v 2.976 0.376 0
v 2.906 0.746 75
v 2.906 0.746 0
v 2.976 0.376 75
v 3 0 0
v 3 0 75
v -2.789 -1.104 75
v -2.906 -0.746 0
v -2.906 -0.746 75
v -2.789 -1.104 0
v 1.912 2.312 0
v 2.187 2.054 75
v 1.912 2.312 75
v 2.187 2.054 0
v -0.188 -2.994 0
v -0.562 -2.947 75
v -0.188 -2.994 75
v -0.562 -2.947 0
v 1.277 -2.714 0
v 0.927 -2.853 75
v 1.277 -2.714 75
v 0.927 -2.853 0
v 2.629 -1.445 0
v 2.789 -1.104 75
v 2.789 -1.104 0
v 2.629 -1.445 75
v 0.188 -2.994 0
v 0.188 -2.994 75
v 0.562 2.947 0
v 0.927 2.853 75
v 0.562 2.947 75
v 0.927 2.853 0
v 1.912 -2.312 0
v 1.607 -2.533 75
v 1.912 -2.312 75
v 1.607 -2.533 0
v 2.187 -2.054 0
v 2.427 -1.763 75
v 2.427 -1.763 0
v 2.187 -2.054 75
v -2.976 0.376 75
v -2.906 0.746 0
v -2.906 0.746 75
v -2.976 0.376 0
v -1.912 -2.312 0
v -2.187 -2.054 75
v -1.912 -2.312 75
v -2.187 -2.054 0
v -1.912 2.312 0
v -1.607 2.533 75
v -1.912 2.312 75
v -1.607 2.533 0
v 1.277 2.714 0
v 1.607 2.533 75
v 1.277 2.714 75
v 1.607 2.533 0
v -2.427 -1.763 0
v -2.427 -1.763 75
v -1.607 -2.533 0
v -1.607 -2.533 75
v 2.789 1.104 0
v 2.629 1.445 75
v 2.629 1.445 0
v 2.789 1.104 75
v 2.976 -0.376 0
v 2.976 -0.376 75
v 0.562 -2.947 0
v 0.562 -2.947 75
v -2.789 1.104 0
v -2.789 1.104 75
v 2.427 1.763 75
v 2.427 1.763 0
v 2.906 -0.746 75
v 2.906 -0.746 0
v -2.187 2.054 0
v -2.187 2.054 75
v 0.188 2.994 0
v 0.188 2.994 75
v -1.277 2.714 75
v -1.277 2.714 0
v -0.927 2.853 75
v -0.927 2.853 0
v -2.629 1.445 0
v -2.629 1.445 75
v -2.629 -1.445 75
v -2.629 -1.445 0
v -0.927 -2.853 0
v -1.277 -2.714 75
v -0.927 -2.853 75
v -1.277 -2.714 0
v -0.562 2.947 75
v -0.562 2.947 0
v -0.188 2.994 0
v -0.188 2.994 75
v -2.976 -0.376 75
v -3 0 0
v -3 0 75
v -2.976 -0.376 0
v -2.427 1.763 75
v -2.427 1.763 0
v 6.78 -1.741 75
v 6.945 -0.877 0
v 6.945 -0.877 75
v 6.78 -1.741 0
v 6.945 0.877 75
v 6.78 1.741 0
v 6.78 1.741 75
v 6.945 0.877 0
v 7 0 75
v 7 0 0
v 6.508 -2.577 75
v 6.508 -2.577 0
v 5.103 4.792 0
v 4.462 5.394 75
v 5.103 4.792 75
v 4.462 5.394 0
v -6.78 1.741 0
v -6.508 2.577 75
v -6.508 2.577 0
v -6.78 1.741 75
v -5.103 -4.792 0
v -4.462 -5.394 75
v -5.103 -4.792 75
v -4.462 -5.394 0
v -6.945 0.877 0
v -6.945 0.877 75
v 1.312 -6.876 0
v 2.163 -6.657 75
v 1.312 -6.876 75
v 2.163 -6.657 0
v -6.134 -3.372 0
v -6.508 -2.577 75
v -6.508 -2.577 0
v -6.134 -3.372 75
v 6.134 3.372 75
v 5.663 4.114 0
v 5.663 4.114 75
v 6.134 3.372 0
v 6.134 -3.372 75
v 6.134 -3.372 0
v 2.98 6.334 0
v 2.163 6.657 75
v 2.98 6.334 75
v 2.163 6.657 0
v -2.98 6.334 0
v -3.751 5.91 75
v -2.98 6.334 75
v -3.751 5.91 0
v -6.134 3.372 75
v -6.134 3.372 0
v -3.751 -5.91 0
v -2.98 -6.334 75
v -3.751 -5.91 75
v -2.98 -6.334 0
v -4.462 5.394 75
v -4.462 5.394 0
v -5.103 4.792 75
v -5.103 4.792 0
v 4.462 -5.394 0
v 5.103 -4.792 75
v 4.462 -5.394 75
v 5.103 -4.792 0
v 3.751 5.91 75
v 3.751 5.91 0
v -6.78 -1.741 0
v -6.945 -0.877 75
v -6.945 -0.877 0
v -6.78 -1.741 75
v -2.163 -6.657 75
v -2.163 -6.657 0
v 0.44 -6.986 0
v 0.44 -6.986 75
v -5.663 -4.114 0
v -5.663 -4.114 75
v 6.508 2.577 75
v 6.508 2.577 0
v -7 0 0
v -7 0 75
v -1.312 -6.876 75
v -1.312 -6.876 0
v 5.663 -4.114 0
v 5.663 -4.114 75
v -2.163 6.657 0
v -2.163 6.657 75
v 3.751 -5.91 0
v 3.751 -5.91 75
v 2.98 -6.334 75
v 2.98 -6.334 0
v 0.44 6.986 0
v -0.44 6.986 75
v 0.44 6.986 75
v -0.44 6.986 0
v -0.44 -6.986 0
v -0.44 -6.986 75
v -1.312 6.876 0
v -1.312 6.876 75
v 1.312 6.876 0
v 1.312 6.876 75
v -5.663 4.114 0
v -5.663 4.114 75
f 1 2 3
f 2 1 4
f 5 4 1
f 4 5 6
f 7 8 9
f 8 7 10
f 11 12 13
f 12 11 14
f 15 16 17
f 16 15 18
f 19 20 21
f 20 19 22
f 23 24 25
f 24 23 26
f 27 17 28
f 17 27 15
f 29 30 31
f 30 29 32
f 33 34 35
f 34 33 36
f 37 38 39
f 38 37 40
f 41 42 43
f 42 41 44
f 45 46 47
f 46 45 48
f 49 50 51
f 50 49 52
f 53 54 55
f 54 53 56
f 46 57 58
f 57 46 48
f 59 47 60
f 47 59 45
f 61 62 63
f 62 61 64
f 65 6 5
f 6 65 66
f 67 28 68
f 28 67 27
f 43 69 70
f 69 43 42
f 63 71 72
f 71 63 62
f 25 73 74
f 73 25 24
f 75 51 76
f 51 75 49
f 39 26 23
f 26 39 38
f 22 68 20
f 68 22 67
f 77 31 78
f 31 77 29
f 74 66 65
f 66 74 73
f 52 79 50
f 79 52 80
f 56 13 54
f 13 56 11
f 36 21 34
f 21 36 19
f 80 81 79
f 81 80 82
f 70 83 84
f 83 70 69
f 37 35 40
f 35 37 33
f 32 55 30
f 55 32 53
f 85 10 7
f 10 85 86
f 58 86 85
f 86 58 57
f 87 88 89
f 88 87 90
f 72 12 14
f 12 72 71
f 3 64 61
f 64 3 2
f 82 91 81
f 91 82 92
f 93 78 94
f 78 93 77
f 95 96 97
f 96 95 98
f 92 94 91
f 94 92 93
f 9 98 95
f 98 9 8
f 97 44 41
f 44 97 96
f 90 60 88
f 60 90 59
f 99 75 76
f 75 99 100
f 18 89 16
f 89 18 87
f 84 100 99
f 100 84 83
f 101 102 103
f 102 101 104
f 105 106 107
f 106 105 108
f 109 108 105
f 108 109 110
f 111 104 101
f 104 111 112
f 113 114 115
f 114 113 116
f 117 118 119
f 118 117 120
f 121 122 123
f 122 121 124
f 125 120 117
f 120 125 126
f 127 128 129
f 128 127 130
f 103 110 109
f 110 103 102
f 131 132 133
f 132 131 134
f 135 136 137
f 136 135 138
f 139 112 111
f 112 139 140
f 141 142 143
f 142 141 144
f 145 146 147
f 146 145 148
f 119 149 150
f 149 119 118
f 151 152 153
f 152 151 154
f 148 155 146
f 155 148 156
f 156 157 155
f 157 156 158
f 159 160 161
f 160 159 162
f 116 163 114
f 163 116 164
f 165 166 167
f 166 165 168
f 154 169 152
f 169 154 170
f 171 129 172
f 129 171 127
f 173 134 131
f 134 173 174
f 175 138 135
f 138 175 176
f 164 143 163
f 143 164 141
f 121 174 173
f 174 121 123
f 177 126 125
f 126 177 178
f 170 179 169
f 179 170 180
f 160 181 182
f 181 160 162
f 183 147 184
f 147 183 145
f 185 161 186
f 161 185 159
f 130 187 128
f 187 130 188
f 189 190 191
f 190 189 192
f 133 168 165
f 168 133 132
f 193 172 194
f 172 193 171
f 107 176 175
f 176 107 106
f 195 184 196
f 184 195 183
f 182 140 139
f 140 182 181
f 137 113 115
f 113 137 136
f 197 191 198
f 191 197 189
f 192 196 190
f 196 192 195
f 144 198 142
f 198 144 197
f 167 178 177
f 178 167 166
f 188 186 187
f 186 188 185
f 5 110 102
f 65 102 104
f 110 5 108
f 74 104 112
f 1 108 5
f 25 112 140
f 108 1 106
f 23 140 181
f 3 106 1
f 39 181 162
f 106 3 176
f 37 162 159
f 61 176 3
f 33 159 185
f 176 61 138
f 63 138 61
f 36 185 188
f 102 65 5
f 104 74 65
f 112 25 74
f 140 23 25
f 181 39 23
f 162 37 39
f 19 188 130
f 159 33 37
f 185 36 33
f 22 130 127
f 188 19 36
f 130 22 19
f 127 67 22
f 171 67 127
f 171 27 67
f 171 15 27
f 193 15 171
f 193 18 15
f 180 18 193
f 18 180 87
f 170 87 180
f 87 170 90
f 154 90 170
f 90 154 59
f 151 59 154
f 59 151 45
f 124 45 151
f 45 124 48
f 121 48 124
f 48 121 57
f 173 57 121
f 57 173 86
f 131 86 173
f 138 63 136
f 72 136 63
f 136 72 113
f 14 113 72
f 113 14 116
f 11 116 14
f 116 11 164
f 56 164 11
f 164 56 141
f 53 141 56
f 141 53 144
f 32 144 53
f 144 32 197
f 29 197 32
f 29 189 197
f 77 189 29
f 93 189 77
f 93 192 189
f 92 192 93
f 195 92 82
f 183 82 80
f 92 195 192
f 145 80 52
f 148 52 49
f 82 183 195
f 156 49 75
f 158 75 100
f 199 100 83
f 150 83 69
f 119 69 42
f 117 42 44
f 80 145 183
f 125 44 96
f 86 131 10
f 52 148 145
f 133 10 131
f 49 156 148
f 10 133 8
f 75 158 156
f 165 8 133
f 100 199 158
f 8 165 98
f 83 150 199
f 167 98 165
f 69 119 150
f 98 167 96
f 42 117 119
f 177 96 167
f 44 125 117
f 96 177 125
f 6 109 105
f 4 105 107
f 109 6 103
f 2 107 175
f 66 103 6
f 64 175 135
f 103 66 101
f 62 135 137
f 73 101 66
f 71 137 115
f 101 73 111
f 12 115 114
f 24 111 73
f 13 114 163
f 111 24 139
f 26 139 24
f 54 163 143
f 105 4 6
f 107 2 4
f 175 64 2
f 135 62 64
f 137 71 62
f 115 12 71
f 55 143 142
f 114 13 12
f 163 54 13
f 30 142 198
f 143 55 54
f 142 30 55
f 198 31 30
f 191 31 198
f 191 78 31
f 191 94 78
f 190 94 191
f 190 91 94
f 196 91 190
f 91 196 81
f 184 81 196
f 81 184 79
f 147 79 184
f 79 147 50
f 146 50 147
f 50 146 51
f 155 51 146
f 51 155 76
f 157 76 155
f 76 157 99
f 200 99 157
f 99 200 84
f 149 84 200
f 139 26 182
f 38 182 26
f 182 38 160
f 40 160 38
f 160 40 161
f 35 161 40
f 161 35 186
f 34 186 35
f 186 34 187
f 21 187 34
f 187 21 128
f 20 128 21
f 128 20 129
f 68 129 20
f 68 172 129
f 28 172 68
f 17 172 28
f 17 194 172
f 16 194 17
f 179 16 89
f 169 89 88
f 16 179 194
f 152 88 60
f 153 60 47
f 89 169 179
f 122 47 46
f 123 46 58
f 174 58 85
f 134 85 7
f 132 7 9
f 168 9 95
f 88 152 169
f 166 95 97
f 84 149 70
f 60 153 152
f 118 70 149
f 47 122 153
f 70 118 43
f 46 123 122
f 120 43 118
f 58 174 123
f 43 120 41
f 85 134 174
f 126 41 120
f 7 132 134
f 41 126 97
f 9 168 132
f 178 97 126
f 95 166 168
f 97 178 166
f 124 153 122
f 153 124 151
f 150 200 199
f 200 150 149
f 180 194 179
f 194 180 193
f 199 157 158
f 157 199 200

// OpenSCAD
$fn = 50;

difference() {
	union() {
		cylinder(h = 75, r = 7.0);
	}
	union() {
		translate(v = [0, 0, -100]) {
			cylinder(h = 200, r = 3.0);
		}
		translate(v = [0, 0, -100]) {
			cylinder(h = 200, r = 1.5);
		}
	}
}
